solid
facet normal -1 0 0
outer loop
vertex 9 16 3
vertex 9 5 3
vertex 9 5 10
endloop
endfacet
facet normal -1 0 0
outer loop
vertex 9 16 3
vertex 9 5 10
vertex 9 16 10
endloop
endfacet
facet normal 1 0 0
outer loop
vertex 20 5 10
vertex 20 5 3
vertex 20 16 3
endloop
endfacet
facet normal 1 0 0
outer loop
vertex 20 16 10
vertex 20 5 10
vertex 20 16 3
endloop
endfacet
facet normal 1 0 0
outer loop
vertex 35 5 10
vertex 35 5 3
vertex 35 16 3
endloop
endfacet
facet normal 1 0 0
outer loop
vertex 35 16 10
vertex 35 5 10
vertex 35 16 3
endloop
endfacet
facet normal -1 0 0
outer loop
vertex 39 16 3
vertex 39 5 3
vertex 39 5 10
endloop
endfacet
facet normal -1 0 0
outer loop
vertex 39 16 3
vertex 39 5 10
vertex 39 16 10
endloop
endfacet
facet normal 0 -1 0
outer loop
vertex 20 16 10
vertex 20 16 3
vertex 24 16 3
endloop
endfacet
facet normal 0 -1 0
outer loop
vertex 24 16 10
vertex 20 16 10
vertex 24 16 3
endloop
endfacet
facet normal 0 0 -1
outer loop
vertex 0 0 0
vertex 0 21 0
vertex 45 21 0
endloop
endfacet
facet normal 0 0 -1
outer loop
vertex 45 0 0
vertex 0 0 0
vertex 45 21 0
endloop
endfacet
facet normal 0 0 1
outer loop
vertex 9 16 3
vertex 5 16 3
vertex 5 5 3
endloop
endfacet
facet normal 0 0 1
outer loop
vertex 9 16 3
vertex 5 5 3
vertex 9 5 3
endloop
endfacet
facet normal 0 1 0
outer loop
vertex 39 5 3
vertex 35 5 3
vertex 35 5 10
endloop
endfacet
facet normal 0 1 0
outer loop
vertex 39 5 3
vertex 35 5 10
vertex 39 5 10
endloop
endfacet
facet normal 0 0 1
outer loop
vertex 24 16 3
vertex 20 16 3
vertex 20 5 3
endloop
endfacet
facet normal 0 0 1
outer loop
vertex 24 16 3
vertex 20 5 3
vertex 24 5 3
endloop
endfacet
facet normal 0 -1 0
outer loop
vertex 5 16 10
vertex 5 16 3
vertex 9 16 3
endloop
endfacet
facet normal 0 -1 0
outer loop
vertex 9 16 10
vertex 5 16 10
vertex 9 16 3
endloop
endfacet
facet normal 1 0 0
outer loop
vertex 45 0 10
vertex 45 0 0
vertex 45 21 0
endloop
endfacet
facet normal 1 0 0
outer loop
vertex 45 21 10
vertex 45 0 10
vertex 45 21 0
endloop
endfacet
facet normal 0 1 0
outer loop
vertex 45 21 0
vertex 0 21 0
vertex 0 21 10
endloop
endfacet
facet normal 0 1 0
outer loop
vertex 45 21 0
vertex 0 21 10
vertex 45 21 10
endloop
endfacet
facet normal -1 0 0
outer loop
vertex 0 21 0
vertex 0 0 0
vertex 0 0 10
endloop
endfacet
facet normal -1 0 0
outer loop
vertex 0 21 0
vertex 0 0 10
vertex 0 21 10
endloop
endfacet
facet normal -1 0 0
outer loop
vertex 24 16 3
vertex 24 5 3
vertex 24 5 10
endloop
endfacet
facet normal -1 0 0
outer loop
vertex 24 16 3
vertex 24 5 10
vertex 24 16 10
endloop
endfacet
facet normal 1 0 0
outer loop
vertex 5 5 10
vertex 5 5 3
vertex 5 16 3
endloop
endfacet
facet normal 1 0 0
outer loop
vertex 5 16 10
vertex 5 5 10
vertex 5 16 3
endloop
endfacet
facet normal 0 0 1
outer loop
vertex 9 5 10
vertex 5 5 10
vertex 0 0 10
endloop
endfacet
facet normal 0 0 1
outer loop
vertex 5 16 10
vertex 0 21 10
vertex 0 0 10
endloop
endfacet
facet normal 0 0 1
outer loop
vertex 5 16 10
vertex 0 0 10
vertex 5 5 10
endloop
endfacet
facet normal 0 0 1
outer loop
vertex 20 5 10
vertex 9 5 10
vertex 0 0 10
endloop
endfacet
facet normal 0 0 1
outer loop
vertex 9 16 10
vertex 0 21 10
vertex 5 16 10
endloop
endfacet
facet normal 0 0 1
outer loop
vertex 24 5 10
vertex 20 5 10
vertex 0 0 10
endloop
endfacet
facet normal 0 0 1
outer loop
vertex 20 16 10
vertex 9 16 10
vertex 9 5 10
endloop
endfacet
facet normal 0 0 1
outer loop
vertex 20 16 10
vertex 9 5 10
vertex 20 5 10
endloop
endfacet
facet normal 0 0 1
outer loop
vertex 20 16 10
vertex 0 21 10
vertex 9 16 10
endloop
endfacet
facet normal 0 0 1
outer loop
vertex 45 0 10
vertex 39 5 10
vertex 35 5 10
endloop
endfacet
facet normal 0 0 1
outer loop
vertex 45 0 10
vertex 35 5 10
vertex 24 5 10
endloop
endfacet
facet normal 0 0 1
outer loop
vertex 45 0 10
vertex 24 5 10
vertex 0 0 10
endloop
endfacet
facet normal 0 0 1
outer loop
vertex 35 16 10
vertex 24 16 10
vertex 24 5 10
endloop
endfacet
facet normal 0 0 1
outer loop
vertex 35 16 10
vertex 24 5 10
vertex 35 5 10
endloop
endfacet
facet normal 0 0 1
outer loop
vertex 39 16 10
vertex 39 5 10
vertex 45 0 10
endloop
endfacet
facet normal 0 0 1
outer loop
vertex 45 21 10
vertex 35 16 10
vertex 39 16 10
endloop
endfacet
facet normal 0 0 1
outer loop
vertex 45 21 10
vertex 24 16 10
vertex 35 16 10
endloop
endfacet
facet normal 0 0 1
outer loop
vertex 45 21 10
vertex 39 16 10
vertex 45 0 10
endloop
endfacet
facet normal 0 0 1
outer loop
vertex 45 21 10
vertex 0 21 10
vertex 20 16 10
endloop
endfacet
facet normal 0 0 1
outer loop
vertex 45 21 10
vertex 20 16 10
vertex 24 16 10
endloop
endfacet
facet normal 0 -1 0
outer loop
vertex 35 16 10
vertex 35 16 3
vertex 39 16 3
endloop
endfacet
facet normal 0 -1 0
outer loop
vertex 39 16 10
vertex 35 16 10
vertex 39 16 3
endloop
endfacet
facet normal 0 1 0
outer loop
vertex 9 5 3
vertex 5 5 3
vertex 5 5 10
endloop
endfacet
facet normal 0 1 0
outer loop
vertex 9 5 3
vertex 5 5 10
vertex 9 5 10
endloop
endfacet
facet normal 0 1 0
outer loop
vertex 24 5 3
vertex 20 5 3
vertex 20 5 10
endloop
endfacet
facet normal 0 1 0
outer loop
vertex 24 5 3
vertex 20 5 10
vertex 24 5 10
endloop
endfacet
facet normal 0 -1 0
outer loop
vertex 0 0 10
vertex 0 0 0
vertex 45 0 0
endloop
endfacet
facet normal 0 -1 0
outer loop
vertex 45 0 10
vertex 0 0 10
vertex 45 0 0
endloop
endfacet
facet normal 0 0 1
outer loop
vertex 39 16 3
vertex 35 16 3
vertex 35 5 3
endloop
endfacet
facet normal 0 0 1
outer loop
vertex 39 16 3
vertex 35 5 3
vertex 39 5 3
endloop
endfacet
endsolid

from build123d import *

# Parameters (mm, degrees)
BOX001_W     = 4
BOX001_H     = 11
BOX001_DEPTH = 12
BOX002_W     = 4
BOX002_H     = 11
BOX002_DEPTH = 12
BOX_W        = 4
BOX_H        = 11
BOX_DEPTH    = 12
BOX003_W     = 45
BOX003_H     = 21
BOX003_DEPTH = 10


with BuildPart() as cube001:
    # Box001 → Box001 (new body)
    with BuildSketch(Plane(origin=(15, 0, 0), x_dir=(1, 0, 0), z_dir=(0, 0, 1))):
        with Locations((2, 5.5)):
            Rectangle(BOX001_W, BOX001_H)
    extrude(amount=BOX001_DEPTH)


with BuildPart() as cube002:
    # Box002 → Box002 (new body)
    with BuildSketch(Plane(origin=(30, 0, 0), x_dir=(1, 0, 0), z_dir=(0, 0, 1))):
        with Locations((2, 5.5)):
            Rectangle(BOX002_W, BOX002_H)
    extrude(amount=BOX002_DEPTH)


with BuildPart() as fusion:
    # Box → Box (new body)
    with BuildSketch(Plane.XY):
        with Locations((2, 5.5)):
            Rectangle(BOX_W, BOX_H)
    extrude(amount=BOX_DEPTH)

    # Fusion: union Cube001, Cube002
    add(cube001.part)
    add(cube002.part)


with BuildPart() as fusion_1:
    # Fusion placement: moved
    add(fusion.part.moved(Location((5, 5, 3))))


with BuildPart() as cut:
    # Box003 → Box003 (new body)
    with BuildSketch(Plane.XY):
        with Locations((22.5, 10.5)):
            Rectangle(BOX003_W, BOX003_H)
    extrude(amount=BOX003_DEPTH)

    # Cut: cut Fusion
    add(fusion_1.part, mode=Mode.SUBTRACT)


solid = cut.part
